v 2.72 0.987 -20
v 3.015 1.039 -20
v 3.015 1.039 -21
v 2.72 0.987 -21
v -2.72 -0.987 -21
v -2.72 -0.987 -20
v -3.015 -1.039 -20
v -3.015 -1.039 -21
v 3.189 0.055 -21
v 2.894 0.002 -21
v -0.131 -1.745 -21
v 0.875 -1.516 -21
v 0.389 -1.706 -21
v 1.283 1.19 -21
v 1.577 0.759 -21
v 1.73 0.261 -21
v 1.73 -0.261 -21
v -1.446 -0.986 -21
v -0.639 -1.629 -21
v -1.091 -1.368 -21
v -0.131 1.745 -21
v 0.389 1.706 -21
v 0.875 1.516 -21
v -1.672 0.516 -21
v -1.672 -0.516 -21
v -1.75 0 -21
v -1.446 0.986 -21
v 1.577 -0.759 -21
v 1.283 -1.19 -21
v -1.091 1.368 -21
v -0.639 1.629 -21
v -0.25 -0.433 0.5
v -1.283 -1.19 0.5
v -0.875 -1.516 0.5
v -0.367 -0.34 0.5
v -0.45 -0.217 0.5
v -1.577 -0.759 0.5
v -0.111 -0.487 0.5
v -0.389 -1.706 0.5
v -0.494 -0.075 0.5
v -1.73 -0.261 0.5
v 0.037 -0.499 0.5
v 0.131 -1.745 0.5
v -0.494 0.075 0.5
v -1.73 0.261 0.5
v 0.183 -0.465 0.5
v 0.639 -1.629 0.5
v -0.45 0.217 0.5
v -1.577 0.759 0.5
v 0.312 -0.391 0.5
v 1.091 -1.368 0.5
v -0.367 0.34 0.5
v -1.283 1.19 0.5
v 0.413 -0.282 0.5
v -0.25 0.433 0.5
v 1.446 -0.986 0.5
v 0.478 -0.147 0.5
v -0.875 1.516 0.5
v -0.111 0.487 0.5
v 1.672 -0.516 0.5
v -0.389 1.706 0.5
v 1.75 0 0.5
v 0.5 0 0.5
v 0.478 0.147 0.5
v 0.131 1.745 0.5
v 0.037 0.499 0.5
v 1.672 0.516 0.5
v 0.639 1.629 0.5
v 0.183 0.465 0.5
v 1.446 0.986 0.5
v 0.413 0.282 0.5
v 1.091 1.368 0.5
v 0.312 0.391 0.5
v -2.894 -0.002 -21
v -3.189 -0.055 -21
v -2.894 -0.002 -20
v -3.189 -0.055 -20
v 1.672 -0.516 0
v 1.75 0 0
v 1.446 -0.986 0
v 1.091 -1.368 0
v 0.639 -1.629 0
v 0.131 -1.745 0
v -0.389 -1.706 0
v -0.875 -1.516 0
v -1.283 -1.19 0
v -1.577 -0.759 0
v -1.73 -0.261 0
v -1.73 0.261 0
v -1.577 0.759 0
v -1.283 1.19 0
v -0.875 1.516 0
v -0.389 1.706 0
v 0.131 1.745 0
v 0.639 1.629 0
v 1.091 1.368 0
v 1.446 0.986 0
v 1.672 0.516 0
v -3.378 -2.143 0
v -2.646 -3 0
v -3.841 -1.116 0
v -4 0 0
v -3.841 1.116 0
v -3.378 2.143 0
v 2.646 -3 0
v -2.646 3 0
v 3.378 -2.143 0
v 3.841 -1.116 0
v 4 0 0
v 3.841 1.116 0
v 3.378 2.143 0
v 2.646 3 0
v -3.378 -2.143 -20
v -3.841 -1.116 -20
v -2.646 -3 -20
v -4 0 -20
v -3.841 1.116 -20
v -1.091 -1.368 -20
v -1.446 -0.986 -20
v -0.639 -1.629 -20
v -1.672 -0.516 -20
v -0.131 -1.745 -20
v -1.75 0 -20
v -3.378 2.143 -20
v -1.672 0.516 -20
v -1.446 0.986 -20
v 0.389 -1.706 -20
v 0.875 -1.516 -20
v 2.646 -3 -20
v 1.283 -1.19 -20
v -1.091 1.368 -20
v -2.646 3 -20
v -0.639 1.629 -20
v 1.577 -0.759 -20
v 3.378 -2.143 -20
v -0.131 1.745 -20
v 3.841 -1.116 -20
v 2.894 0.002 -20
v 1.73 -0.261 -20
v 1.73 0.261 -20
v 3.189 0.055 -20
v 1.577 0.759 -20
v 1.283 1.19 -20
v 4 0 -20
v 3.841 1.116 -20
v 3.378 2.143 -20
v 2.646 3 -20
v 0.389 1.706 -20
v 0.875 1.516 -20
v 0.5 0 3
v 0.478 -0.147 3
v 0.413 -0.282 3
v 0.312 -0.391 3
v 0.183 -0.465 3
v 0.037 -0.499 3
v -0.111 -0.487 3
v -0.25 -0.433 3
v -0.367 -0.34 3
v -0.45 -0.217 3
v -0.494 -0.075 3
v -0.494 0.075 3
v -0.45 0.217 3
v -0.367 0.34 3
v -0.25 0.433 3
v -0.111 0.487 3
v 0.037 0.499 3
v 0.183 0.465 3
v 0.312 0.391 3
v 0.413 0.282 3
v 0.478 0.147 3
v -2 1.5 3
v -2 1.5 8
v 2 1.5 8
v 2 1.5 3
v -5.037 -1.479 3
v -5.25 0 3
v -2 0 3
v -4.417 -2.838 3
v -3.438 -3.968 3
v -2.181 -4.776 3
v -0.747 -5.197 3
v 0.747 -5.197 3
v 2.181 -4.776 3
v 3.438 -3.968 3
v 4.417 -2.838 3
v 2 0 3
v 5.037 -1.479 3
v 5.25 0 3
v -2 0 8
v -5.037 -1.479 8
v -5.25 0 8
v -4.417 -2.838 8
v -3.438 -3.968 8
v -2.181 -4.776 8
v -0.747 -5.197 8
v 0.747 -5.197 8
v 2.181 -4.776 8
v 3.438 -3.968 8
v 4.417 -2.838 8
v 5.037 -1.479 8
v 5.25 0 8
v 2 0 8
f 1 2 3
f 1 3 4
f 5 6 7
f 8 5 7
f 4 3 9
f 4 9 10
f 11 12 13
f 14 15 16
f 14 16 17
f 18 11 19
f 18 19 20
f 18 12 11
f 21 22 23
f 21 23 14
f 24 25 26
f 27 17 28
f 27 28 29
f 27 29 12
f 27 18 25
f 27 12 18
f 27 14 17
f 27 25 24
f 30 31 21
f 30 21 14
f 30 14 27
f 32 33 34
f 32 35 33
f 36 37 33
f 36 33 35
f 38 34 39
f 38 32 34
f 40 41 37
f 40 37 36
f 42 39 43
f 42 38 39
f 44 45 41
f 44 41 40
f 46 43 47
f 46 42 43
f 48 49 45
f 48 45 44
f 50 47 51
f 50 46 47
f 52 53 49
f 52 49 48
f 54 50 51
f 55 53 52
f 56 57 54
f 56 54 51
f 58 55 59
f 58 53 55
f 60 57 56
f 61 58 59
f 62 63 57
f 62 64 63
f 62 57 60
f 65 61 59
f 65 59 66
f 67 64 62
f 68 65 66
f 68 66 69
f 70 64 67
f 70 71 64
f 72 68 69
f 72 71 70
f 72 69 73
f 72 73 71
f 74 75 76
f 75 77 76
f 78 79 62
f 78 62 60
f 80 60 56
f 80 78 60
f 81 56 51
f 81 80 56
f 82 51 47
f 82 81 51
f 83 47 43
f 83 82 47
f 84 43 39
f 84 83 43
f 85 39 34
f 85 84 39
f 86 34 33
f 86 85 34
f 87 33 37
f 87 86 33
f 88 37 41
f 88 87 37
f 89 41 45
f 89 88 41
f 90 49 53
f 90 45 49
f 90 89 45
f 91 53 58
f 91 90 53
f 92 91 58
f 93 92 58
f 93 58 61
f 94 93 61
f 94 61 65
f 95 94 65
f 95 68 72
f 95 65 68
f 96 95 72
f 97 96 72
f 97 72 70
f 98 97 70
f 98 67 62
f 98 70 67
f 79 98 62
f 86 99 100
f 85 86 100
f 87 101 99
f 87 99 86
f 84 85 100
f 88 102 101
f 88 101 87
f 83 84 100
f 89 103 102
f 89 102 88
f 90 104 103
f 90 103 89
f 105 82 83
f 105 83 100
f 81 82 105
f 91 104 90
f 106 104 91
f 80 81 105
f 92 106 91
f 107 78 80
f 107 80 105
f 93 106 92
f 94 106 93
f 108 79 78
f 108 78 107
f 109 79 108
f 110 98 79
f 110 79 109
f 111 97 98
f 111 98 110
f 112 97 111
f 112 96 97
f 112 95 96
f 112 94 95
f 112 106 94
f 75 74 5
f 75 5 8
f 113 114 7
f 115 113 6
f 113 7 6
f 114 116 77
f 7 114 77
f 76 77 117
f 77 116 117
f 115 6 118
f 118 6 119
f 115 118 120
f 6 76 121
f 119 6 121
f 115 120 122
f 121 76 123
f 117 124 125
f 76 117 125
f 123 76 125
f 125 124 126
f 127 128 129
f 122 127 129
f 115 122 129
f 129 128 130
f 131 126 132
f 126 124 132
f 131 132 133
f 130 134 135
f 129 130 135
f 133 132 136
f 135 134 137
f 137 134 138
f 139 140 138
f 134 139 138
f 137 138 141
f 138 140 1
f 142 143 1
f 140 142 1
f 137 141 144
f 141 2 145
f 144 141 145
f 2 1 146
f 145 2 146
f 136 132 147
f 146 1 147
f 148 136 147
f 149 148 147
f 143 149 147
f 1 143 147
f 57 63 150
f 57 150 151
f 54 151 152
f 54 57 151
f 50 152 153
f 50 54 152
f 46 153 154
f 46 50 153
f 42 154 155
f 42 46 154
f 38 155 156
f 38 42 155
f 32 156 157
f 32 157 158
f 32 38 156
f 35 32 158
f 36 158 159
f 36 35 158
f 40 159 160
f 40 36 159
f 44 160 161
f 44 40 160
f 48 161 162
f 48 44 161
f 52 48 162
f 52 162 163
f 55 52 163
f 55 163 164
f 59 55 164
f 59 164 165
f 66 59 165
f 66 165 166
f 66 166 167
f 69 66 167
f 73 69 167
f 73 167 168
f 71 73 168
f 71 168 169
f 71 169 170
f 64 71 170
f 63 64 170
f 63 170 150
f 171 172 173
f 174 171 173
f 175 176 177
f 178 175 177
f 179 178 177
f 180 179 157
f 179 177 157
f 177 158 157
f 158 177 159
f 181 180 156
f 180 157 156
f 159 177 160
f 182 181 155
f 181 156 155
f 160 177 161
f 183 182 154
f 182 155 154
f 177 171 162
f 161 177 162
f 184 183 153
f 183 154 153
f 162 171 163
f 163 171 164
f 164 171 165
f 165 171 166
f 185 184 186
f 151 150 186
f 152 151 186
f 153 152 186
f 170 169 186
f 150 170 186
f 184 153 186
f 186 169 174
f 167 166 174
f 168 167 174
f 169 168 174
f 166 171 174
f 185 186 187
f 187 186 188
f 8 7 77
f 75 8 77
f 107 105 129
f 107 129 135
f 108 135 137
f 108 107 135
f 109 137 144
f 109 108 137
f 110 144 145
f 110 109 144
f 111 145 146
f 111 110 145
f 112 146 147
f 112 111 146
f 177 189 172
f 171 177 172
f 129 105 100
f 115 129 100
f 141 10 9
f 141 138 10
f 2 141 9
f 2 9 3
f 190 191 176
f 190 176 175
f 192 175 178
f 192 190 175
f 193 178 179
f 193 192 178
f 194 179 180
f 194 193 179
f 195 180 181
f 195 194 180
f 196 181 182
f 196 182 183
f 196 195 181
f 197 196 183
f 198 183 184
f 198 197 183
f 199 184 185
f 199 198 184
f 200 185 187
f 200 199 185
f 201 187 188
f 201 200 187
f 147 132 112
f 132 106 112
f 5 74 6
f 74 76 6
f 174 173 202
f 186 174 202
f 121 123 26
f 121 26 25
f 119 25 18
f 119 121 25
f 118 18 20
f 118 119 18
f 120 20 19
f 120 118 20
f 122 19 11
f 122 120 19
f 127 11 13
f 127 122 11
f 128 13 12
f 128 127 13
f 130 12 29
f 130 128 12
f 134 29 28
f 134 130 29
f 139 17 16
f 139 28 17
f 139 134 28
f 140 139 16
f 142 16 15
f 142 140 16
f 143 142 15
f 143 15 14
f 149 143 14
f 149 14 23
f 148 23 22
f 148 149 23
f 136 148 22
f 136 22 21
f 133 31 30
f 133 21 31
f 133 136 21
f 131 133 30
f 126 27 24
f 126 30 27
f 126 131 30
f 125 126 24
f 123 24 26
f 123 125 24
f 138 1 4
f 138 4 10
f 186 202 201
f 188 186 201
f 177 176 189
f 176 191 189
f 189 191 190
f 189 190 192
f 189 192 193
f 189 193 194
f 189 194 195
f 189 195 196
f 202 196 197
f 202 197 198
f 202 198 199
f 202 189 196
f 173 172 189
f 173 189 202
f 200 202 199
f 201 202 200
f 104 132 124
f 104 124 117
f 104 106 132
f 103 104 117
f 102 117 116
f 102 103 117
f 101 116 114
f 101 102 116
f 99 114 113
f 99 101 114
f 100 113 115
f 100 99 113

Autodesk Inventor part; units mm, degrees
ref_plane "YZ Plane" through (0, 0, 0) normal (1, 0, 0) x (0, 1, 0)
ref_plane "XZ Plane" through (0, 0, 0) normal (0, 1, 0) x (-1, 0, 0)
ref_plane "XY Plane" through (0, 0, 0) normal (0, 0, 1) x (1, 0, 0)
sketch "Sketch2" plane through (0, 0, 0) normal (0, 0, 1) x (1, 0, 0)
  circle A0 centre (0, 0) radius 4
  dimension "d0" = 8
extrude "Extrusion1" add sketch "Sketch2" against normal blind 20
sketch "Sketch3" plane through (0, 0, 0) normal (0, 0, 1) x (1, 0, 0)
  circle A0 centre (0, 0) radius 4 projected
  line L0 (-4, 3) -> (4, 3)
  line L1 (4, 3) -> (4, -3)
  line L2 (4, -3) -> (-4, -3)
  line L3 (-4, -3) -> (-4, 3)
  line L4 (-4, 3) -> (4, 3)
  line L5 (4, 3) -> (4, 4)
  line L6 (4, 4) -> (-4, 4)
  line L7 (-4, 4) -> (-4, 3)
  line L8 (-4, 0) -> (4, 0) construction
  point P0 (4, 3.5)
  dimension "d3" = 6
extrude "Extrusion2" cut sketch "Sketch3" against normal up to surface (20 mm away) from surface at 0 contours L0 A0 | A0 L6 L5 L0 | A0 L0 L7 L6
mirror "Mirror1" about plane through (0, 0, 0) normal (0, 1, 0) of "Extrusion2"
sketch "Sketch5" plane through (0, 0, 0) normal (0, 0, 1) x (1, 0, 0)
  circle A0 centre (0, 0) radius 1.75
  dimension "d6" = 3.5
extrude "Extrusion3" add sketch "Sketch5" along normal blind 0.5
sketch "Sketch6" plane through (0, 0, 0) normal (0, 0, 1) x (1, 0, 0)
  circle A0 centre (0, 0) radius 0.5
  dimension "d9" = 1
extrude "Extrusion4" add sketch "Sketch6" along normal blind 8
sketch "Sketch7" plane through (0, 0, 8) normal (0, 0, 1) x (1, 0, 0)
  circle A0 centre (0, 0) radius 5.25
  dimension "d12" = 10.5
extrude "Extrusion5" add sketch "Sketch7" against normal blind 5
sketch "Sketch8" plane through (0, 0, 8) normal (0, 0, 1) x (1, 0, 0)
  circle A0 centre (0, 0) radius 5.25 projected
  line L0 (-2, 1.5) -> (2, 1.5)
  line L1 (2, 1.5) -> (2, 0)
  line L2 (2, 0) -> (-2, 0)
  line L3 (-2, 0) -> (-2, 1.5)
  line L4 (-5.25, 0) -> (5.25, 0)
  dimension "d15" = 4
  dimension "d16" = 1.5
extrude "Extrusion6" cut sketch "Sketch8" against normal up to surface (5 mm away) contours L4 L1 L0 L3 A0
sketch "Sketch9" plane through (0, 0, -20) normal (0, 0, -1) x (-1, 0, 0)
  circle A0 centre (0, 0) radius 1.75
  dimension "d19" = 3.5
extrude "Extrusion7" add sketch "Sketch9" along normal blind 1
sketch "Sketch10" plane through (0, 0, -20) normal (0, 0, -1) x (-1, 0, 0)
  circle A0 centre (0, 0) radius 1.75 projected
  line L0 (-2.6458, -3) -> (2.6458, -3) projected
  arc A1 (2.6458, -3) -> (2.6458, 3) centre (0, 0) ccw projected
  line L1 (2.6458, 3) -> (-2.6458, 3) projected
  arc A2 (-2.6458, 3) -> (-2.6458, -3) centre (0, 0) ccw projected
  arc A3 (-2.6458, 3) -> (-2.6458, -3) centre (0, 0) ccw construction
  line L2 (-4, 0) -> (4, 0) construction
  arc A4 (2.6458, -3) -> (2.6458, 3) centre (0, 0) ccw construction
  line L3 (-3.9392, 0.6946) -> (3.9392, -0.6946) construction
  line L4 (-3.0153, 1.0394) -> (-2.7199, 0.9873)
  line L5 (-2.7199, 0.9873) -> (-2.8935, 0.0025)
  line L6 (-2.8935, 0.0025) -> (-3.189, 0.0546)
  line L7 (-3.189, 0.0546) -> (-3.0153, 1.0394)
  line L8 (0.3039, 1.7234) -> (-0.3039, -1.7234) construction
  line L9 (3.189, -0.0546) -> (2.8935, -0.0025)
  line L10 (2.8935, -0.0025) -> (2.7199, -0.9873)
  line L11 (2.7199, -0.9873) -> (3.0153, -1.0394)
  line L12 (3.0153, -1.0394) -> (3.189, -0.0546)
  point P0 (0, 0)
  dimension "d22" = 10
  dimension "d23" = 0.3
  dimension "d24" = 1
  dimension "d25" = 0.5
  dimension "d26" = 2.85
extrude "Extrusion8" add sketch "Sketch10" along normal blind 1 contours L4 L5 L6 L7 | L12 L11 L10 L9
ref_plane "Work Plane1" through (0, 0, 0) normal (0, 1, 0) x (-1, 0, 0)
equation "\"d25\" = 0.5 * d24"
properties part number "308-106"
